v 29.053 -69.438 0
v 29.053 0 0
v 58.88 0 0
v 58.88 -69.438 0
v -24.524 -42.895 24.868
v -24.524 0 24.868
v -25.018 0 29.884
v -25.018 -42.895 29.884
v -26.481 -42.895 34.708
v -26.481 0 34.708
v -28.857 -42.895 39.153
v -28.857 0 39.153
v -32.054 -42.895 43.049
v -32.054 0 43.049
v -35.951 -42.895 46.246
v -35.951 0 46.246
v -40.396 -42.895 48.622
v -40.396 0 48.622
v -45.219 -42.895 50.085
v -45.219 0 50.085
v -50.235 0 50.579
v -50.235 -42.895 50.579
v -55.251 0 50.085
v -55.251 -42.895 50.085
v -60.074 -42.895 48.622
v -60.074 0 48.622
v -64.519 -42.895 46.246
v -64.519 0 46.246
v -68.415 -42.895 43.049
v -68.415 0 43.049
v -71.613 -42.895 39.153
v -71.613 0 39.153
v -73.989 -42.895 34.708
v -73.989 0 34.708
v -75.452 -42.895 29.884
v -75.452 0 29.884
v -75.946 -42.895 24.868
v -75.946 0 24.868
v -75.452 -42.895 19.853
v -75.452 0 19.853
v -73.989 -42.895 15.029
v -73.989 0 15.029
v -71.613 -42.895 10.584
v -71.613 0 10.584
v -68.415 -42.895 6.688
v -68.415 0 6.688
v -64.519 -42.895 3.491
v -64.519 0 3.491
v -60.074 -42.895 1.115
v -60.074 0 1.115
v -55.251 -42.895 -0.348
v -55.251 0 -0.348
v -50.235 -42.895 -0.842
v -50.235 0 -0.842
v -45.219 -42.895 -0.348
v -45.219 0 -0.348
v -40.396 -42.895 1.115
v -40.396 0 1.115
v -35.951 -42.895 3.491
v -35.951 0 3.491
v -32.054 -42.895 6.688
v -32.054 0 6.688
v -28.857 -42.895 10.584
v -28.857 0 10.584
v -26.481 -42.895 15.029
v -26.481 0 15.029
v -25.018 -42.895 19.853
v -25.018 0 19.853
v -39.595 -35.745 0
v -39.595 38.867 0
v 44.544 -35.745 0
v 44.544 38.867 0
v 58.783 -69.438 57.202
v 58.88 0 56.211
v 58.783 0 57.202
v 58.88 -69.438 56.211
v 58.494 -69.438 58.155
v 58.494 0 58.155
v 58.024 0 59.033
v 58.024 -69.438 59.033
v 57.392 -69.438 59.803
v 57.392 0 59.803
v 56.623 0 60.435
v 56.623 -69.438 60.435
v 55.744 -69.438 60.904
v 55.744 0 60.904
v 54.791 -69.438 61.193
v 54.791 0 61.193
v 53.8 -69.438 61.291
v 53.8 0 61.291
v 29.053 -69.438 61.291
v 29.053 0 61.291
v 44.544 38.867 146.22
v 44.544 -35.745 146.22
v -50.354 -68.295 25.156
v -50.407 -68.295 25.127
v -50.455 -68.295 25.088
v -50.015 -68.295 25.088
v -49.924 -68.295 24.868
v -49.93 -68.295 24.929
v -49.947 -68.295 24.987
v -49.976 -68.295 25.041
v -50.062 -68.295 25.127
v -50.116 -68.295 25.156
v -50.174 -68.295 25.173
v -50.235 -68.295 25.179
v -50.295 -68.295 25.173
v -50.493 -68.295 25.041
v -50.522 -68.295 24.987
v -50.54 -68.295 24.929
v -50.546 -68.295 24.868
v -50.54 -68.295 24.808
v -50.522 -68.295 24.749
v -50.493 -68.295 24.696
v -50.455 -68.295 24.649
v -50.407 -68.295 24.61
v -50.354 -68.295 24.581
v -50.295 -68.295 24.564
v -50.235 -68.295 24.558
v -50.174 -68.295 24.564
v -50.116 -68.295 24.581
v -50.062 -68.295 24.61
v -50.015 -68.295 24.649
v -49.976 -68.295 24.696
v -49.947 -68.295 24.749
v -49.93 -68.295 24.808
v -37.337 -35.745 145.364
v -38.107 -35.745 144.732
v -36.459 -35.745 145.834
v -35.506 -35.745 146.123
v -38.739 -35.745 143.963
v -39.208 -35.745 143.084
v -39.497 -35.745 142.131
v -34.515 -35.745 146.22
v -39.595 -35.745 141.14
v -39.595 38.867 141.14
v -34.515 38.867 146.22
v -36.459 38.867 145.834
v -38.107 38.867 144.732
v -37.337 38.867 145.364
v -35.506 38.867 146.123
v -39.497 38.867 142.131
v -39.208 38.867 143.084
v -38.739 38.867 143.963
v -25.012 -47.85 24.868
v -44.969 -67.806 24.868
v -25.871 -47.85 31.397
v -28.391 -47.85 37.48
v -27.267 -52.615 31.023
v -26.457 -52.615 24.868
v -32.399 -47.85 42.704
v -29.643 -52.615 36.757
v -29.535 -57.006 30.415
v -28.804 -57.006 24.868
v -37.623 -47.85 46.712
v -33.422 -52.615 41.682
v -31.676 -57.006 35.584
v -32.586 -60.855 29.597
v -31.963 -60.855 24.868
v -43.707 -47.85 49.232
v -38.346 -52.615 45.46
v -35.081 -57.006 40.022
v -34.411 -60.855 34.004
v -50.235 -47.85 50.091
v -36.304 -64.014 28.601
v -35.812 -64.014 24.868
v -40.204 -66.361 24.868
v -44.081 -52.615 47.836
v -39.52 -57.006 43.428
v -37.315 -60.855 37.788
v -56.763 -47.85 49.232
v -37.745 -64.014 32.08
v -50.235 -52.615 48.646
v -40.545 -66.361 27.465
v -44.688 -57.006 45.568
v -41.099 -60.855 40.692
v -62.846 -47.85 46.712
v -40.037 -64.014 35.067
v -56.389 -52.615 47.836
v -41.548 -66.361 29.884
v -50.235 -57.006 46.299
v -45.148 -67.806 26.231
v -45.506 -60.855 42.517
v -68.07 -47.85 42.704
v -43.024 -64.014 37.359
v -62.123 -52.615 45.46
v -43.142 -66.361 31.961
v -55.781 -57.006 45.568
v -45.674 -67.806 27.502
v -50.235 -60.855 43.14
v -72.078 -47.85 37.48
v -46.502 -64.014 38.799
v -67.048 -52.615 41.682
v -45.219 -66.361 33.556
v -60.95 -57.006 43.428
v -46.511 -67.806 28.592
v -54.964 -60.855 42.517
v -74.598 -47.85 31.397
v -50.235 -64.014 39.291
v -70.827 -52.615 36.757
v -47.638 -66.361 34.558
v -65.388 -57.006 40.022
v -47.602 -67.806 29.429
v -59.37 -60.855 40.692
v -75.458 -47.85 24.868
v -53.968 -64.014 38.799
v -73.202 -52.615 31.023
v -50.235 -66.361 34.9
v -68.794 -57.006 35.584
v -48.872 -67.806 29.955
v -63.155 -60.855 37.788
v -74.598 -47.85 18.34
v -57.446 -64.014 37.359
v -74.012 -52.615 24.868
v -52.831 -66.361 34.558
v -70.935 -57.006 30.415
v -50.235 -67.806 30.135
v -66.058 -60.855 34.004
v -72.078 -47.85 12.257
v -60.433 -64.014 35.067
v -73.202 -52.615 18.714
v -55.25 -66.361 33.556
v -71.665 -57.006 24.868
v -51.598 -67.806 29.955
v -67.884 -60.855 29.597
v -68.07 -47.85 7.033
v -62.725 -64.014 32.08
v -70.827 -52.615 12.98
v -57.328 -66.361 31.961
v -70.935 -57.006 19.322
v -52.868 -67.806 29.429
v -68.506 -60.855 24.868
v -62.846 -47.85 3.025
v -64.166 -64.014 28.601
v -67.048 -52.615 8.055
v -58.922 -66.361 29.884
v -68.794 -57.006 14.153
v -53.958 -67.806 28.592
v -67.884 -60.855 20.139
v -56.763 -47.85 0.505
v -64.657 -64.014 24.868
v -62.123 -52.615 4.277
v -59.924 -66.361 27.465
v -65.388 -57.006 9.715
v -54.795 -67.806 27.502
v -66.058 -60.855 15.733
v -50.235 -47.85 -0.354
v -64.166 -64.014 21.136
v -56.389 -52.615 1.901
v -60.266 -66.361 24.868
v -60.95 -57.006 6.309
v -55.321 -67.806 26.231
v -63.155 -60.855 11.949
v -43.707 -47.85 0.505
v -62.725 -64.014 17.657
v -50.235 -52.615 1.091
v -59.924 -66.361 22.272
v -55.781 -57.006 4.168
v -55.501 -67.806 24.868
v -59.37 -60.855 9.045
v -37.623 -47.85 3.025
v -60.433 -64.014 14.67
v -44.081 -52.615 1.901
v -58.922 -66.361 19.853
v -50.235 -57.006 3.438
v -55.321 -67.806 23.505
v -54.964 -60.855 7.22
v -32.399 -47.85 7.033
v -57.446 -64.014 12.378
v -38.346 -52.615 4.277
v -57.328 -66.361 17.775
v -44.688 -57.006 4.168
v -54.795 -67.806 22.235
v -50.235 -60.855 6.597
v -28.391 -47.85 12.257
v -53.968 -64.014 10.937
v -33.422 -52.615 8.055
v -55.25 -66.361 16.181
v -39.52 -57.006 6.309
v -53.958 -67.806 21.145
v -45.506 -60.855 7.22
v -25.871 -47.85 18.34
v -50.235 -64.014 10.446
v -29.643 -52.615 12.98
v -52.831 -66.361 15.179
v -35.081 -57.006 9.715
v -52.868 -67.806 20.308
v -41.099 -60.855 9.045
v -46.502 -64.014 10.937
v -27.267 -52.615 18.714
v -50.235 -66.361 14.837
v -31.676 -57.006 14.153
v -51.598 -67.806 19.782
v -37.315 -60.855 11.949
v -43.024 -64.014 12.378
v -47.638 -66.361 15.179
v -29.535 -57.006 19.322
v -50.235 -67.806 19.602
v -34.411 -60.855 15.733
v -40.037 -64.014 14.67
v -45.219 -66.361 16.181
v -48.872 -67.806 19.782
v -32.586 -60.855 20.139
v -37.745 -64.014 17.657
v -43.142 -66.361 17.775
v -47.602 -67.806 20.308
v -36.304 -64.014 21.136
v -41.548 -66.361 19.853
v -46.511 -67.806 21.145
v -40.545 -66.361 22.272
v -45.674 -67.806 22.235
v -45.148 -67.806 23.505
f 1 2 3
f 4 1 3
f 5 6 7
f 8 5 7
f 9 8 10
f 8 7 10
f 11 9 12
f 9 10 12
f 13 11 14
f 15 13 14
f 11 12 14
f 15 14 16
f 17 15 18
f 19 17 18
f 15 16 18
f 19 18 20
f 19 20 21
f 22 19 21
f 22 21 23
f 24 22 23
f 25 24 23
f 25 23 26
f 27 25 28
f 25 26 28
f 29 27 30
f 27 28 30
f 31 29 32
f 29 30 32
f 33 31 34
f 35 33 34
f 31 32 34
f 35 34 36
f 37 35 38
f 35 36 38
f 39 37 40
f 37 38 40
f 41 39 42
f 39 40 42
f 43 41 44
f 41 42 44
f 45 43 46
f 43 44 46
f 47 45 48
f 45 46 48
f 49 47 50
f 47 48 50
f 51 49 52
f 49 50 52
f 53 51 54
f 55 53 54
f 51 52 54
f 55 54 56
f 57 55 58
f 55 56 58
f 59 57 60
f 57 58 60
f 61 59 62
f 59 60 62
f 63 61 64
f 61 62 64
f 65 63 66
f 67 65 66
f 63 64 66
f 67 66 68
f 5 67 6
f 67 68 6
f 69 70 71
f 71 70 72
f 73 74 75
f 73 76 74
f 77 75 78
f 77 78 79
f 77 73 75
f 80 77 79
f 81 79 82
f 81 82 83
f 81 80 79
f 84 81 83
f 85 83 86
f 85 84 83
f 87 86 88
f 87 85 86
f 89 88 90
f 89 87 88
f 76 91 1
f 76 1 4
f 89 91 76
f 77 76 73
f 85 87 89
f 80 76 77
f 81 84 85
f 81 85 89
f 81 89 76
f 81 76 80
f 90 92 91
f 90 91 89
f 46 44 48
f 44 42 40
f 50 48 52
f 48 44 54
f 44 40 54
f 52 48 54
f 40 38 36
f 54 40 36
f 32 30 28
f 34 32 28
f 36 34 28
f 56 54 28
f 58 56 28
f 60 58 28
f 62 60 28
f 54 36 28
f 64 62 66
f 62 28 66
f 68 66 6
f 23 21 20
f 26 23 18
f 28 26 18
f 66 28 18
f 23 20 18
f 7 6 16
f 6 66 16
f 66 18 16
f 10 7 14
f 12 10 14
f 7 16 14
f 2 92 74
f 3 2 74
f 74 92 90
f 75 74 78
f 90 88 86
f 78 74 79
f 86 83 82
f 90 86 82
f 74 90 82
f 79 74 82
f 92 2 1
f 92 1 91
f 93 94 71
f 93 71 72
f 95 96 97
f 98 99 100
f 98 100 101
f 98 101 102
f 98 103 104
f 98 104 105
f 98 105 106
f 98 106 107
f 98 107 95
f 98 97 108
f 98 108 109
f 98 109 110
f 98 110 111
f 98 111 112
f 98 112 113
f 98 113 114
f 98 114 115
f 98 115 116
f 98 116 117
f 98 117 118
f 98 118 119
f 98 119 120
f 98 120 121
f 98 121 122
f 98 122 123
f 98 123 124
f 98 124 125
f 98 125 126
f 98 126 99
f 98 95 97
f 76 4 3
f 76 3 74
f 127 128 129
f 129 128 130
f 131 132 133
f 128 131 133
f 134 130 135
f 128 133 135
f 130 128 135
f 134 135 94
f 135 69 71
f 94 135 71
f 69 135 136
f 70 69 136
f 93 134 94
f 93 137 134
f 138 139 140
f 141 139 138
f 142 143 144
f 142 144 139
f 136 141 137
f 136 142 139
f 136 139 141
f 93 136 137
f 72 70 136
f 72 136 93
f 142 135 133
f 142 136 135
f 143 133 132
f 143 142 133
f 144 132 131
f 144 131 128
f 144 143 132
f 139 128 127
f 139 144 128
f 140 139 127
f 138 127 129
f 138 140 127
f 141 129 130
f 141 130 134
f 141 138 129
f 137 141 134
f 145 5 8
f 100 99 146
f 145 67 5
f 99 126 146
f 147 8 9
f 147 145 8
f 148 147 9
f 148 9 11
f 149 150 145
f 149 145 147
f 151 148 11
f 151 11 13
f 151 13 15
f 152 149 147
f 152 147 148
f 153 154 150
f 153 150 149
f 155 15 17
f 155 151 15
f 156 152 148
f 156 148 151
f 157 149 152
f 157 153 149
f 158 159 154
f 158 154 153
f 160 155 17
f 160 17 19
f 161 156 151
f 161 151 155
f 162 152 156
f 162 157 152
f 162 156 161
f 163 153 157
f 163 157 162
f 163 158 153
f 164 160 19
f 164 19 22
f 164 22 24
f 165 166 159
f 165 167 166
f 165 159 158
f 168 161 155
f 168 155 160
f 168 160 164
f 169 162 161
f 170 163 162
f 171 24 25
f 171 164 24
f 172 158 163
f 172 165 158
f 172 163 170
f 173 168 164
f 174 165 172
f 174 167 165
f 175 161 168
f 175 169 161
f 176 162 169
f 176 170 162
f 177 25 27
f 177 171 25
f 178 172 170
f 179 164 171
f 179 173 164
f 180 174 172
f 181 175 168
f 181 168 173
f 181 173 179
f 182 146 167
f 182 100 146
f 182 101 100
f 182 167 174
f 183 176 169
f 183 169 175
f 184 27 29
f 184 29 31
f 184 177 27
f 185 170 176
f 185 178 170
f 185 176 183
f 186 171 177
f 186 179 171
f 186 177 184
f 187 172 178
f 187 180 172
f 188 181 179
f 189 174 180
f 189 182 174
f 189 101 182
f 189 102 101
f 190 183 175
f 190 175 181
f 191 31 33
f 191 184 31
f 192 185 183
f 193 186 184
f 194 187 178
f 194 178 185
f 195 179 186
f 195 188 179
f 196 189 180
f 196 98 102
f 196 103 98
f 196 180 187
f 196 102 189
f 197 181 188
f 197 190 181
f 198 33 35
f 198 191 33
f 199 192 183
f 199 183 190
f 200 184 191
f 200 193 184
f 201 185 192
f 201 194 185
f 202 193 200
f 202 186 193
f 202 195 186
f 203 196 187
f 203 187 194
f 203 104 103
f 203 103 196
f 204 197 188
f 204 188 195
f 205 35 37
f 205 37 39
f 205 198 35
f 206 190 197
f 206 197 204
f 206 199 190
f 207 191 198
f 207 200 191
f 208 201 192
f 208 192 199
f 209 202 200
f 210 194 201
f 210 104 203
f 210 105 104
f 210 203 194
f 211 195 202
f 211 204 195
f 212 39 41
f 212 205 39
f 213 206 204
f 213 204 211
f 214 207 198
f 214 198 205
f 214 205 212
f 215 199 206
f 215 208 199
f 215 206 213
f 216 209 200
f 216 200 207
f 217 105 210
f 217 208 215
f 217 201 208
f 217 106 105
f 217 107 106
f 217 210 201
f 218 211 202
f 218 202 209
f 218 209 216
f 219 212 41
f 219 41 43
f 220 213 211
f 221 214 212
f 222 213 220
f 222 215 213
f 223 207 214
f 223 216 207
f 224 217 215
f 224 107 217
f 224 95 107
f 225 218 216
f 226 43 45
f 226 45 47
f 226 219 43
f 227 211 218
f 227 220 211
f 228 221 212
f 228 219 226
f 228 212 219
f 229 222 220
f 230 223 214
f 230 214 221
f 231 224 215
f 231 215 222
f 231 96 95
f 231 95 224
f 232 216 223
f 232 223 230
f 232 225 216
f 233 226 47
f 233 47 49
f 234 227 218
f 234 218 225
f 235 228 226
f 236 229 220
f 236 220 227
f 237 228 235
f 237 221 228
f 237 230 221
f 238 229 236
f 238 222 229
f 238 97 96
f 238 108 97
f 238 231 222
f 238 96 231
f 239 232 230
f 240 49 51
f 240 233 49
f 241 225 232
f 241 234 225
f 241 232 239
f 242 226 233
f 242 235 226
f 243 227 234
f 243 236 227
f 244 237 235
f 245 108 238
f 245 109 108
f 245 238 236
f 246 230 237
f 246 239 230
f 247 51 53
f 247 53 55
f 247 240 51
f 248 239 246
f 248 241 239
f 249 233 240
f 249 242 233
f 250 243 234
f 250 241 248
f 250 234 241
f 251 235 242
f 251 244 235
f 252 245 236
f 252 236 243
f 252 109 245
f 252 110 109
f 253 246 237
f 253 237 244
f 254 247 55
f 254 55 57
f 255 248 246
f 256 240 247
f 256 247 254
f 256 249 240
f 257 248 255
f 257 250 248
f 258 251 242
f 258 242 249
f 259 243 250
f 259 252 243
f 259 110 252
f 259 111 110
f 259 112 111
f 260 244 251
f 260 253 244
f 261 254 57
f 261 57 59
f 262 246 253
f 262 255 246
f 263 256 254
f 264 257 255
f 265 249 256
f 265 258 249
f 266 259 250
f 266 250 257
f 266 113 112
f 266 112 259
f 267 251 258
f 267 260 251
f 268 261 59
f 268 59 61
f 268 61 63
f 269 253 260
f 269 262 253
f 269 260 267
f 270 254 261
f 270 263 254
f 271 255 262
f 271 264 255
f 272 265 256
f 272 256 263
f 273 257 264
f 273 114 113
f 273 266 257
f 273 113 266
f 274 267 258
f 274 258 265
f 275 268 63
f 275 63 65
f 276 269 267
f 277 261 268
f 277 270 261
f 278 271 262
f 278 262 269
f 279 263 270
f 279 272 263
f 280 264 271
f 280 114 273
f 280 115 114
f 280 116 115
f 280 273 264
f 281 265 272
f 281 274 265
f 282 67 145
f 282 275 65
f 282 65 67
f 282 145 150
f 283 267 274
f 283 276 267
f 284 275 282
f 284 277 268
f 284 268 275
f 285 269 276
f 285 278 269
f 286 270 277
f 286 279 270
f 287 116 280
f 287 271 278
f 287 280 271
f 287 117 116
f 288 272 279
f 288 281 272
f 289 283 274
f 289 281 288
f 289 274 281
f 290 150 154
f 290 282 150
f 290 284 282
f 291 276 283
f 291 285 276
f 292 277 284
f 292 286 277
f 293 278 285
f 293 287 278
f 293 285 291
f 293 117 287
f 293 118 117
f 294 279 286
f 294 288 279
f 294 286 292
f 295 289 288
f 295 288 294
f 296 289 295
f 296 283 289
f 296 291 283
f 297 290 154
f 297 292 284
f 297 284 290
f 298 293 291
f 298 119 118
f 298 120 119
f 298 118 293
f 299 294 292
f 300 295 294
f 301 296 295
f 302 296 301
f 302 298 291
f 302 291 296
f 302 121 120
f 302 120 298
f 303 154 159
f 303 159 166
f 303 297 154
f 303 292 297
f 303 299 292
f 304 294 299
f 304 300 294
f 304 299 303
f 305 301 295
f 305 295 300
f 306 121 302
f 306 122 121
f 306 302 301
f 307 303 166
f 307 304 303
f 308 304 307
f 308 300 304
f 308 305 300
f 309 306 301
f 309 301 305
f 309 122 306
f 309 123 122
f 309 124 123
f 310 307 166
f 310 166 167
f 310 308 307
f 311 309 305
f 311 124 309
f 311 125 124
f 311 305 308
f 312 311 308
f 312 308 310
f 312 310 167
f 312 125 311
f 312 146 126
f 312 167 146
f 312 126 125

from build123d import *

# Parameters (mm, degrees)
F0_W     = 29.826738
F0_H     = 61.290868
F1_DEPTH = 69.43786
F2_R     = 5.08
F3_R     = 25.710907
F4_DEPTH = 68.29451
F5_R     = 25.4
F6_W     = 84.138699
F6_H     = 74.612185
F7_DEPTH = 146.220258
F8_R     = 5.08


with BuildPart() as f1:
    # F0 (on Front) → F1 (new body)
    with BuildSketch(Plane.XZ):
        with Locations((43.966837, 30.645434)):
            Rectangle(F0_W, F0_H)
    extrude(amount=F1_DEPTH)

    # F2
    f2_edges = [f1.edges().sort_by_distance(p)[0] for p in [
        (58.880206, -34.71893, 61.290868),
    ]]
    fillet(f2_edges, radius=F2_R)


with BuildPart() as f4:
    # F3 (on Front) → F4 (new body)
    with BuildSketch(Plane.XZ):
        with Locations((-50.234728, 24.868451)):
            Circle(F3_R)
    extrude(amount=F4_DEPTH)

    # F5
    f5_edges = [f4.edges().sort_by_distance(p)[0] for p in [
        (-75.945634, -68.29451, 24.868451),
    ]]
    fillet(f5_edges, radius=F5_R)


with BuildPart() as f7:
    # F6 (on Top) → F7 (new body)
    with BuildSketch(Plane.XY):
        with Locations((2.474676, 1.560874)):
            Rectangle(F6_W, F6_H)
    extrude(amount=F7_DEPTH)

    # F8
    f8_edges = [f7.edges().sort_by_distance(p)[0] for p in [
        (-39.594673, 1.560874, 146.220258),
    ]]
    fillet(f8_edges, radius=F8_R)


solid = Compound([f1.part, f4.part, f7.part])
